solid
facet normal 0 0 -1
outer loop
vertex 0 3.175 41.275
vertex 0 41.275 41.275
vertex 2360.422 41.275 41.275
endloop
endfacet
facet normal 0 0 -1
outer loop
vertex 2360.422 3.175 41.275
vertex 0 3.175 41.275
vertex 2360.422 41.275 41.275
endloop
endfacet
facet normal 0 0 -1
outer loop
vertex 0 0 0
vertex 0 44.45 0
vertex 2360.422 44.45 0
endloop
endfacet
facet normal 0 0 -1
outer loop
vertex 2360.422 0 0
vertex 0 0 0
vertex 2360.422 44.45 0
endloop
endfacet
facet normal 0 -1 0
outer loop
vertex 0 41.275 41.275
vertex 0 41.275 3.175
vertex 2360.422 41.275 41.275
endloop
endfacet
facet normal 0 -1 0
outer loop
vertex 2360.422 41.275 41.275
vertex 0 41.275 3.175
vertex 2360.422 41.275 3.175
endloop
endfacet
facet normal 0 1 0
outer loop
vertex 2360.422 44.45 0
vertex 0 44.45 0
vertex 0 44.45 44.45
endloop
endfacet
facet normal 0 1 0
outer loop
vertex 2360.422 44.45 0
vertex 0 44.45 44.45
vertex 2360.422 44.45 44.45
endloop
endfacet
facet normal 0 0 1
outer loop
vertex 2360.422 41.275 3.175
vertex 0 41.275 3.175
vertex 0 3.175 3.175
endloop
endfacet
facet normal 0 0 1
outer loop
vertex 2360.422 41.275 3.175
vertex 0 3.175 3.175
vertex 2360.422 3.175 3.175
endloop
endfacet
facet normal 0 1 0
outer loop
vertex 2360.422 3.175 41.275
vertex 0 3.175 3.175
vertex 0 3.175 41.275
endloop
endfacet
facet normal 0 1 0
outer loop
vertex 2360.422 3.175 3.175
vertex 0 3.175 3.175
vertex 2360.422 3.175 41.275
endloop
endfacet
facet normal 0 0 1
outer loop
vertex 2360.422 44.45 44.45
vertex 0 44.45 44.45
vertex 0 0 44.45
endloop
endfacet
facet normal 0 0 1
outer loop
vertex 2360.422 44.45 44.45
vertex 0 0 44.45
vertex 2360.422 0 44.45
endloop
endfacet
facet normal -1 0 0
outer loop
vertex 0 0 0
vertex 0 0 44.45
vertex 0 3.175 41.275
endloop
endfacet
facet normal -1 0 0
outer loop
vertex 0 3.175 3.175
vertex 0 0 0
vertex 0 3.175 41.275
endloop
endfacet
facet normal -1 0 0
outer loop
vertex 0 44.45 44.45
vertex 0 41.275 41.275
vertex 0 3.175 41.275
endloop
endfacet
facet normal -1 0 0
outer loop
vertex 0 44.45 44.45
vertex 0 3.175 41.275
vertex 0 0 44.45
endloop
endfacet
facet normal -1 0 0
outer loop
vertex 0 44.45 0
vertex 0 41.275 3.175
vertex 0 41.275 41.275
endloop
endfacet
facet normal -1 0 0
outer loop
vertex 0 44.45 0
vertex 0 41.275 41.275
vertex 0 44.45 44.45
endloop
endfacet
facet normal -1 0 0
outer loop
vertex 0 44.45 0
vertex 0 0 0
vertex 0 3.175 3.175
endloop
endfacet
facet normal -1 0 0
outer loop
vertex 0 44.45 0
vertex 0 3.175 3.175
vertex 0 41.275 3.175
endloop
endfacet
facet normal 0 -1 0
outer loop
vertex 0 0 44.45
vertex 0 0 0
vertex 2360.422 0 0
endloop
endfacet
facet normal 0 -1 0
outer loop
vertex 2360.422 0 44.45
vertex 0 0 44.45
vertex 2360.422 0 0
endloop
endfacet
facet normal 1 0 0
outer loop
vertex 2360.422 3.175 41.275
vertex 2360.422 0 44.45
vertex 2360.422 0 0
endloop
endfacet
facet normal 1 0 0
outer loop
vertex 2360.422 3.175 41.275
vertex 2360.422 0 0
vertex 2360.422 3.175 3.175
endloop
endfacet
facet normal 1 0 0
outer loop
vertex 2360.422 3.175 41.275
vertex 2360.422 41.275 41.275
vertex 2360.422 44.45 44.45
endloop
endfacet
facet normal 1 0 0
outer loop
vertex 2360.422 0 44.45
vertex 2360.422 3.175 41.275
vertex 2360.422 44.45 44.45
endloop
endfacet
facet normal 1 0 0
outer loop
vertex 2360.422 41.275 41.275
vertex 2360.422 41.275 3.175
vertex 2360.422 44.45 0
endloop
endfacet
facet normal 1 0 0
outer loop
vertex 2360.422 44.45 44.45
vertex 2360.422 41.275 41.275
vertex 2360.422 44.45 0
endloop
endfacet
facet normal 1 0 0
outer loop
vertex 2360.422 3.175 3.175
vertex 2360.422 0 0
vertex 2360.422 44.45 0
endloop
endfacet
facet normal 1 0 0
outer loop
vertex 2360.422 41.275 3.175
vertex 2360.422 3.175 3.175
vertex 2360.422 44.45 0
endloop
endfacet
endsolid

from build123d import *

# Parameters (mm, degrees)
SKETCH1_W           = 2360.422
SKETCH1_H           = 44.45
BOSS_EXTRUDE1_DEPTH = 44.45
SHELL1_T            = -3.175


with BuildPart() as part:
    # Sketch1 → Boss-Extrude1 (new body)
    with BuildSketch(Plane.XY):
        with Locations((1180.211, 22.225)):
            Rectangle(SKETCH1_W, SKETCH1_H)
    extrude(amount=BOSS_EXTRUDE1_DEPTH)

    # Shell1
    shell1_openings = [part.faces().sort_by_distance(p)[0] for p in [
        (2360.422, 22.225, 22.225),
        (0, 22.225, 22.225),
    ]]
    offset(amount=SHELL1_T, openings=shell1_openings, kind=Kind.INTERSECTION)


solid = part.part
